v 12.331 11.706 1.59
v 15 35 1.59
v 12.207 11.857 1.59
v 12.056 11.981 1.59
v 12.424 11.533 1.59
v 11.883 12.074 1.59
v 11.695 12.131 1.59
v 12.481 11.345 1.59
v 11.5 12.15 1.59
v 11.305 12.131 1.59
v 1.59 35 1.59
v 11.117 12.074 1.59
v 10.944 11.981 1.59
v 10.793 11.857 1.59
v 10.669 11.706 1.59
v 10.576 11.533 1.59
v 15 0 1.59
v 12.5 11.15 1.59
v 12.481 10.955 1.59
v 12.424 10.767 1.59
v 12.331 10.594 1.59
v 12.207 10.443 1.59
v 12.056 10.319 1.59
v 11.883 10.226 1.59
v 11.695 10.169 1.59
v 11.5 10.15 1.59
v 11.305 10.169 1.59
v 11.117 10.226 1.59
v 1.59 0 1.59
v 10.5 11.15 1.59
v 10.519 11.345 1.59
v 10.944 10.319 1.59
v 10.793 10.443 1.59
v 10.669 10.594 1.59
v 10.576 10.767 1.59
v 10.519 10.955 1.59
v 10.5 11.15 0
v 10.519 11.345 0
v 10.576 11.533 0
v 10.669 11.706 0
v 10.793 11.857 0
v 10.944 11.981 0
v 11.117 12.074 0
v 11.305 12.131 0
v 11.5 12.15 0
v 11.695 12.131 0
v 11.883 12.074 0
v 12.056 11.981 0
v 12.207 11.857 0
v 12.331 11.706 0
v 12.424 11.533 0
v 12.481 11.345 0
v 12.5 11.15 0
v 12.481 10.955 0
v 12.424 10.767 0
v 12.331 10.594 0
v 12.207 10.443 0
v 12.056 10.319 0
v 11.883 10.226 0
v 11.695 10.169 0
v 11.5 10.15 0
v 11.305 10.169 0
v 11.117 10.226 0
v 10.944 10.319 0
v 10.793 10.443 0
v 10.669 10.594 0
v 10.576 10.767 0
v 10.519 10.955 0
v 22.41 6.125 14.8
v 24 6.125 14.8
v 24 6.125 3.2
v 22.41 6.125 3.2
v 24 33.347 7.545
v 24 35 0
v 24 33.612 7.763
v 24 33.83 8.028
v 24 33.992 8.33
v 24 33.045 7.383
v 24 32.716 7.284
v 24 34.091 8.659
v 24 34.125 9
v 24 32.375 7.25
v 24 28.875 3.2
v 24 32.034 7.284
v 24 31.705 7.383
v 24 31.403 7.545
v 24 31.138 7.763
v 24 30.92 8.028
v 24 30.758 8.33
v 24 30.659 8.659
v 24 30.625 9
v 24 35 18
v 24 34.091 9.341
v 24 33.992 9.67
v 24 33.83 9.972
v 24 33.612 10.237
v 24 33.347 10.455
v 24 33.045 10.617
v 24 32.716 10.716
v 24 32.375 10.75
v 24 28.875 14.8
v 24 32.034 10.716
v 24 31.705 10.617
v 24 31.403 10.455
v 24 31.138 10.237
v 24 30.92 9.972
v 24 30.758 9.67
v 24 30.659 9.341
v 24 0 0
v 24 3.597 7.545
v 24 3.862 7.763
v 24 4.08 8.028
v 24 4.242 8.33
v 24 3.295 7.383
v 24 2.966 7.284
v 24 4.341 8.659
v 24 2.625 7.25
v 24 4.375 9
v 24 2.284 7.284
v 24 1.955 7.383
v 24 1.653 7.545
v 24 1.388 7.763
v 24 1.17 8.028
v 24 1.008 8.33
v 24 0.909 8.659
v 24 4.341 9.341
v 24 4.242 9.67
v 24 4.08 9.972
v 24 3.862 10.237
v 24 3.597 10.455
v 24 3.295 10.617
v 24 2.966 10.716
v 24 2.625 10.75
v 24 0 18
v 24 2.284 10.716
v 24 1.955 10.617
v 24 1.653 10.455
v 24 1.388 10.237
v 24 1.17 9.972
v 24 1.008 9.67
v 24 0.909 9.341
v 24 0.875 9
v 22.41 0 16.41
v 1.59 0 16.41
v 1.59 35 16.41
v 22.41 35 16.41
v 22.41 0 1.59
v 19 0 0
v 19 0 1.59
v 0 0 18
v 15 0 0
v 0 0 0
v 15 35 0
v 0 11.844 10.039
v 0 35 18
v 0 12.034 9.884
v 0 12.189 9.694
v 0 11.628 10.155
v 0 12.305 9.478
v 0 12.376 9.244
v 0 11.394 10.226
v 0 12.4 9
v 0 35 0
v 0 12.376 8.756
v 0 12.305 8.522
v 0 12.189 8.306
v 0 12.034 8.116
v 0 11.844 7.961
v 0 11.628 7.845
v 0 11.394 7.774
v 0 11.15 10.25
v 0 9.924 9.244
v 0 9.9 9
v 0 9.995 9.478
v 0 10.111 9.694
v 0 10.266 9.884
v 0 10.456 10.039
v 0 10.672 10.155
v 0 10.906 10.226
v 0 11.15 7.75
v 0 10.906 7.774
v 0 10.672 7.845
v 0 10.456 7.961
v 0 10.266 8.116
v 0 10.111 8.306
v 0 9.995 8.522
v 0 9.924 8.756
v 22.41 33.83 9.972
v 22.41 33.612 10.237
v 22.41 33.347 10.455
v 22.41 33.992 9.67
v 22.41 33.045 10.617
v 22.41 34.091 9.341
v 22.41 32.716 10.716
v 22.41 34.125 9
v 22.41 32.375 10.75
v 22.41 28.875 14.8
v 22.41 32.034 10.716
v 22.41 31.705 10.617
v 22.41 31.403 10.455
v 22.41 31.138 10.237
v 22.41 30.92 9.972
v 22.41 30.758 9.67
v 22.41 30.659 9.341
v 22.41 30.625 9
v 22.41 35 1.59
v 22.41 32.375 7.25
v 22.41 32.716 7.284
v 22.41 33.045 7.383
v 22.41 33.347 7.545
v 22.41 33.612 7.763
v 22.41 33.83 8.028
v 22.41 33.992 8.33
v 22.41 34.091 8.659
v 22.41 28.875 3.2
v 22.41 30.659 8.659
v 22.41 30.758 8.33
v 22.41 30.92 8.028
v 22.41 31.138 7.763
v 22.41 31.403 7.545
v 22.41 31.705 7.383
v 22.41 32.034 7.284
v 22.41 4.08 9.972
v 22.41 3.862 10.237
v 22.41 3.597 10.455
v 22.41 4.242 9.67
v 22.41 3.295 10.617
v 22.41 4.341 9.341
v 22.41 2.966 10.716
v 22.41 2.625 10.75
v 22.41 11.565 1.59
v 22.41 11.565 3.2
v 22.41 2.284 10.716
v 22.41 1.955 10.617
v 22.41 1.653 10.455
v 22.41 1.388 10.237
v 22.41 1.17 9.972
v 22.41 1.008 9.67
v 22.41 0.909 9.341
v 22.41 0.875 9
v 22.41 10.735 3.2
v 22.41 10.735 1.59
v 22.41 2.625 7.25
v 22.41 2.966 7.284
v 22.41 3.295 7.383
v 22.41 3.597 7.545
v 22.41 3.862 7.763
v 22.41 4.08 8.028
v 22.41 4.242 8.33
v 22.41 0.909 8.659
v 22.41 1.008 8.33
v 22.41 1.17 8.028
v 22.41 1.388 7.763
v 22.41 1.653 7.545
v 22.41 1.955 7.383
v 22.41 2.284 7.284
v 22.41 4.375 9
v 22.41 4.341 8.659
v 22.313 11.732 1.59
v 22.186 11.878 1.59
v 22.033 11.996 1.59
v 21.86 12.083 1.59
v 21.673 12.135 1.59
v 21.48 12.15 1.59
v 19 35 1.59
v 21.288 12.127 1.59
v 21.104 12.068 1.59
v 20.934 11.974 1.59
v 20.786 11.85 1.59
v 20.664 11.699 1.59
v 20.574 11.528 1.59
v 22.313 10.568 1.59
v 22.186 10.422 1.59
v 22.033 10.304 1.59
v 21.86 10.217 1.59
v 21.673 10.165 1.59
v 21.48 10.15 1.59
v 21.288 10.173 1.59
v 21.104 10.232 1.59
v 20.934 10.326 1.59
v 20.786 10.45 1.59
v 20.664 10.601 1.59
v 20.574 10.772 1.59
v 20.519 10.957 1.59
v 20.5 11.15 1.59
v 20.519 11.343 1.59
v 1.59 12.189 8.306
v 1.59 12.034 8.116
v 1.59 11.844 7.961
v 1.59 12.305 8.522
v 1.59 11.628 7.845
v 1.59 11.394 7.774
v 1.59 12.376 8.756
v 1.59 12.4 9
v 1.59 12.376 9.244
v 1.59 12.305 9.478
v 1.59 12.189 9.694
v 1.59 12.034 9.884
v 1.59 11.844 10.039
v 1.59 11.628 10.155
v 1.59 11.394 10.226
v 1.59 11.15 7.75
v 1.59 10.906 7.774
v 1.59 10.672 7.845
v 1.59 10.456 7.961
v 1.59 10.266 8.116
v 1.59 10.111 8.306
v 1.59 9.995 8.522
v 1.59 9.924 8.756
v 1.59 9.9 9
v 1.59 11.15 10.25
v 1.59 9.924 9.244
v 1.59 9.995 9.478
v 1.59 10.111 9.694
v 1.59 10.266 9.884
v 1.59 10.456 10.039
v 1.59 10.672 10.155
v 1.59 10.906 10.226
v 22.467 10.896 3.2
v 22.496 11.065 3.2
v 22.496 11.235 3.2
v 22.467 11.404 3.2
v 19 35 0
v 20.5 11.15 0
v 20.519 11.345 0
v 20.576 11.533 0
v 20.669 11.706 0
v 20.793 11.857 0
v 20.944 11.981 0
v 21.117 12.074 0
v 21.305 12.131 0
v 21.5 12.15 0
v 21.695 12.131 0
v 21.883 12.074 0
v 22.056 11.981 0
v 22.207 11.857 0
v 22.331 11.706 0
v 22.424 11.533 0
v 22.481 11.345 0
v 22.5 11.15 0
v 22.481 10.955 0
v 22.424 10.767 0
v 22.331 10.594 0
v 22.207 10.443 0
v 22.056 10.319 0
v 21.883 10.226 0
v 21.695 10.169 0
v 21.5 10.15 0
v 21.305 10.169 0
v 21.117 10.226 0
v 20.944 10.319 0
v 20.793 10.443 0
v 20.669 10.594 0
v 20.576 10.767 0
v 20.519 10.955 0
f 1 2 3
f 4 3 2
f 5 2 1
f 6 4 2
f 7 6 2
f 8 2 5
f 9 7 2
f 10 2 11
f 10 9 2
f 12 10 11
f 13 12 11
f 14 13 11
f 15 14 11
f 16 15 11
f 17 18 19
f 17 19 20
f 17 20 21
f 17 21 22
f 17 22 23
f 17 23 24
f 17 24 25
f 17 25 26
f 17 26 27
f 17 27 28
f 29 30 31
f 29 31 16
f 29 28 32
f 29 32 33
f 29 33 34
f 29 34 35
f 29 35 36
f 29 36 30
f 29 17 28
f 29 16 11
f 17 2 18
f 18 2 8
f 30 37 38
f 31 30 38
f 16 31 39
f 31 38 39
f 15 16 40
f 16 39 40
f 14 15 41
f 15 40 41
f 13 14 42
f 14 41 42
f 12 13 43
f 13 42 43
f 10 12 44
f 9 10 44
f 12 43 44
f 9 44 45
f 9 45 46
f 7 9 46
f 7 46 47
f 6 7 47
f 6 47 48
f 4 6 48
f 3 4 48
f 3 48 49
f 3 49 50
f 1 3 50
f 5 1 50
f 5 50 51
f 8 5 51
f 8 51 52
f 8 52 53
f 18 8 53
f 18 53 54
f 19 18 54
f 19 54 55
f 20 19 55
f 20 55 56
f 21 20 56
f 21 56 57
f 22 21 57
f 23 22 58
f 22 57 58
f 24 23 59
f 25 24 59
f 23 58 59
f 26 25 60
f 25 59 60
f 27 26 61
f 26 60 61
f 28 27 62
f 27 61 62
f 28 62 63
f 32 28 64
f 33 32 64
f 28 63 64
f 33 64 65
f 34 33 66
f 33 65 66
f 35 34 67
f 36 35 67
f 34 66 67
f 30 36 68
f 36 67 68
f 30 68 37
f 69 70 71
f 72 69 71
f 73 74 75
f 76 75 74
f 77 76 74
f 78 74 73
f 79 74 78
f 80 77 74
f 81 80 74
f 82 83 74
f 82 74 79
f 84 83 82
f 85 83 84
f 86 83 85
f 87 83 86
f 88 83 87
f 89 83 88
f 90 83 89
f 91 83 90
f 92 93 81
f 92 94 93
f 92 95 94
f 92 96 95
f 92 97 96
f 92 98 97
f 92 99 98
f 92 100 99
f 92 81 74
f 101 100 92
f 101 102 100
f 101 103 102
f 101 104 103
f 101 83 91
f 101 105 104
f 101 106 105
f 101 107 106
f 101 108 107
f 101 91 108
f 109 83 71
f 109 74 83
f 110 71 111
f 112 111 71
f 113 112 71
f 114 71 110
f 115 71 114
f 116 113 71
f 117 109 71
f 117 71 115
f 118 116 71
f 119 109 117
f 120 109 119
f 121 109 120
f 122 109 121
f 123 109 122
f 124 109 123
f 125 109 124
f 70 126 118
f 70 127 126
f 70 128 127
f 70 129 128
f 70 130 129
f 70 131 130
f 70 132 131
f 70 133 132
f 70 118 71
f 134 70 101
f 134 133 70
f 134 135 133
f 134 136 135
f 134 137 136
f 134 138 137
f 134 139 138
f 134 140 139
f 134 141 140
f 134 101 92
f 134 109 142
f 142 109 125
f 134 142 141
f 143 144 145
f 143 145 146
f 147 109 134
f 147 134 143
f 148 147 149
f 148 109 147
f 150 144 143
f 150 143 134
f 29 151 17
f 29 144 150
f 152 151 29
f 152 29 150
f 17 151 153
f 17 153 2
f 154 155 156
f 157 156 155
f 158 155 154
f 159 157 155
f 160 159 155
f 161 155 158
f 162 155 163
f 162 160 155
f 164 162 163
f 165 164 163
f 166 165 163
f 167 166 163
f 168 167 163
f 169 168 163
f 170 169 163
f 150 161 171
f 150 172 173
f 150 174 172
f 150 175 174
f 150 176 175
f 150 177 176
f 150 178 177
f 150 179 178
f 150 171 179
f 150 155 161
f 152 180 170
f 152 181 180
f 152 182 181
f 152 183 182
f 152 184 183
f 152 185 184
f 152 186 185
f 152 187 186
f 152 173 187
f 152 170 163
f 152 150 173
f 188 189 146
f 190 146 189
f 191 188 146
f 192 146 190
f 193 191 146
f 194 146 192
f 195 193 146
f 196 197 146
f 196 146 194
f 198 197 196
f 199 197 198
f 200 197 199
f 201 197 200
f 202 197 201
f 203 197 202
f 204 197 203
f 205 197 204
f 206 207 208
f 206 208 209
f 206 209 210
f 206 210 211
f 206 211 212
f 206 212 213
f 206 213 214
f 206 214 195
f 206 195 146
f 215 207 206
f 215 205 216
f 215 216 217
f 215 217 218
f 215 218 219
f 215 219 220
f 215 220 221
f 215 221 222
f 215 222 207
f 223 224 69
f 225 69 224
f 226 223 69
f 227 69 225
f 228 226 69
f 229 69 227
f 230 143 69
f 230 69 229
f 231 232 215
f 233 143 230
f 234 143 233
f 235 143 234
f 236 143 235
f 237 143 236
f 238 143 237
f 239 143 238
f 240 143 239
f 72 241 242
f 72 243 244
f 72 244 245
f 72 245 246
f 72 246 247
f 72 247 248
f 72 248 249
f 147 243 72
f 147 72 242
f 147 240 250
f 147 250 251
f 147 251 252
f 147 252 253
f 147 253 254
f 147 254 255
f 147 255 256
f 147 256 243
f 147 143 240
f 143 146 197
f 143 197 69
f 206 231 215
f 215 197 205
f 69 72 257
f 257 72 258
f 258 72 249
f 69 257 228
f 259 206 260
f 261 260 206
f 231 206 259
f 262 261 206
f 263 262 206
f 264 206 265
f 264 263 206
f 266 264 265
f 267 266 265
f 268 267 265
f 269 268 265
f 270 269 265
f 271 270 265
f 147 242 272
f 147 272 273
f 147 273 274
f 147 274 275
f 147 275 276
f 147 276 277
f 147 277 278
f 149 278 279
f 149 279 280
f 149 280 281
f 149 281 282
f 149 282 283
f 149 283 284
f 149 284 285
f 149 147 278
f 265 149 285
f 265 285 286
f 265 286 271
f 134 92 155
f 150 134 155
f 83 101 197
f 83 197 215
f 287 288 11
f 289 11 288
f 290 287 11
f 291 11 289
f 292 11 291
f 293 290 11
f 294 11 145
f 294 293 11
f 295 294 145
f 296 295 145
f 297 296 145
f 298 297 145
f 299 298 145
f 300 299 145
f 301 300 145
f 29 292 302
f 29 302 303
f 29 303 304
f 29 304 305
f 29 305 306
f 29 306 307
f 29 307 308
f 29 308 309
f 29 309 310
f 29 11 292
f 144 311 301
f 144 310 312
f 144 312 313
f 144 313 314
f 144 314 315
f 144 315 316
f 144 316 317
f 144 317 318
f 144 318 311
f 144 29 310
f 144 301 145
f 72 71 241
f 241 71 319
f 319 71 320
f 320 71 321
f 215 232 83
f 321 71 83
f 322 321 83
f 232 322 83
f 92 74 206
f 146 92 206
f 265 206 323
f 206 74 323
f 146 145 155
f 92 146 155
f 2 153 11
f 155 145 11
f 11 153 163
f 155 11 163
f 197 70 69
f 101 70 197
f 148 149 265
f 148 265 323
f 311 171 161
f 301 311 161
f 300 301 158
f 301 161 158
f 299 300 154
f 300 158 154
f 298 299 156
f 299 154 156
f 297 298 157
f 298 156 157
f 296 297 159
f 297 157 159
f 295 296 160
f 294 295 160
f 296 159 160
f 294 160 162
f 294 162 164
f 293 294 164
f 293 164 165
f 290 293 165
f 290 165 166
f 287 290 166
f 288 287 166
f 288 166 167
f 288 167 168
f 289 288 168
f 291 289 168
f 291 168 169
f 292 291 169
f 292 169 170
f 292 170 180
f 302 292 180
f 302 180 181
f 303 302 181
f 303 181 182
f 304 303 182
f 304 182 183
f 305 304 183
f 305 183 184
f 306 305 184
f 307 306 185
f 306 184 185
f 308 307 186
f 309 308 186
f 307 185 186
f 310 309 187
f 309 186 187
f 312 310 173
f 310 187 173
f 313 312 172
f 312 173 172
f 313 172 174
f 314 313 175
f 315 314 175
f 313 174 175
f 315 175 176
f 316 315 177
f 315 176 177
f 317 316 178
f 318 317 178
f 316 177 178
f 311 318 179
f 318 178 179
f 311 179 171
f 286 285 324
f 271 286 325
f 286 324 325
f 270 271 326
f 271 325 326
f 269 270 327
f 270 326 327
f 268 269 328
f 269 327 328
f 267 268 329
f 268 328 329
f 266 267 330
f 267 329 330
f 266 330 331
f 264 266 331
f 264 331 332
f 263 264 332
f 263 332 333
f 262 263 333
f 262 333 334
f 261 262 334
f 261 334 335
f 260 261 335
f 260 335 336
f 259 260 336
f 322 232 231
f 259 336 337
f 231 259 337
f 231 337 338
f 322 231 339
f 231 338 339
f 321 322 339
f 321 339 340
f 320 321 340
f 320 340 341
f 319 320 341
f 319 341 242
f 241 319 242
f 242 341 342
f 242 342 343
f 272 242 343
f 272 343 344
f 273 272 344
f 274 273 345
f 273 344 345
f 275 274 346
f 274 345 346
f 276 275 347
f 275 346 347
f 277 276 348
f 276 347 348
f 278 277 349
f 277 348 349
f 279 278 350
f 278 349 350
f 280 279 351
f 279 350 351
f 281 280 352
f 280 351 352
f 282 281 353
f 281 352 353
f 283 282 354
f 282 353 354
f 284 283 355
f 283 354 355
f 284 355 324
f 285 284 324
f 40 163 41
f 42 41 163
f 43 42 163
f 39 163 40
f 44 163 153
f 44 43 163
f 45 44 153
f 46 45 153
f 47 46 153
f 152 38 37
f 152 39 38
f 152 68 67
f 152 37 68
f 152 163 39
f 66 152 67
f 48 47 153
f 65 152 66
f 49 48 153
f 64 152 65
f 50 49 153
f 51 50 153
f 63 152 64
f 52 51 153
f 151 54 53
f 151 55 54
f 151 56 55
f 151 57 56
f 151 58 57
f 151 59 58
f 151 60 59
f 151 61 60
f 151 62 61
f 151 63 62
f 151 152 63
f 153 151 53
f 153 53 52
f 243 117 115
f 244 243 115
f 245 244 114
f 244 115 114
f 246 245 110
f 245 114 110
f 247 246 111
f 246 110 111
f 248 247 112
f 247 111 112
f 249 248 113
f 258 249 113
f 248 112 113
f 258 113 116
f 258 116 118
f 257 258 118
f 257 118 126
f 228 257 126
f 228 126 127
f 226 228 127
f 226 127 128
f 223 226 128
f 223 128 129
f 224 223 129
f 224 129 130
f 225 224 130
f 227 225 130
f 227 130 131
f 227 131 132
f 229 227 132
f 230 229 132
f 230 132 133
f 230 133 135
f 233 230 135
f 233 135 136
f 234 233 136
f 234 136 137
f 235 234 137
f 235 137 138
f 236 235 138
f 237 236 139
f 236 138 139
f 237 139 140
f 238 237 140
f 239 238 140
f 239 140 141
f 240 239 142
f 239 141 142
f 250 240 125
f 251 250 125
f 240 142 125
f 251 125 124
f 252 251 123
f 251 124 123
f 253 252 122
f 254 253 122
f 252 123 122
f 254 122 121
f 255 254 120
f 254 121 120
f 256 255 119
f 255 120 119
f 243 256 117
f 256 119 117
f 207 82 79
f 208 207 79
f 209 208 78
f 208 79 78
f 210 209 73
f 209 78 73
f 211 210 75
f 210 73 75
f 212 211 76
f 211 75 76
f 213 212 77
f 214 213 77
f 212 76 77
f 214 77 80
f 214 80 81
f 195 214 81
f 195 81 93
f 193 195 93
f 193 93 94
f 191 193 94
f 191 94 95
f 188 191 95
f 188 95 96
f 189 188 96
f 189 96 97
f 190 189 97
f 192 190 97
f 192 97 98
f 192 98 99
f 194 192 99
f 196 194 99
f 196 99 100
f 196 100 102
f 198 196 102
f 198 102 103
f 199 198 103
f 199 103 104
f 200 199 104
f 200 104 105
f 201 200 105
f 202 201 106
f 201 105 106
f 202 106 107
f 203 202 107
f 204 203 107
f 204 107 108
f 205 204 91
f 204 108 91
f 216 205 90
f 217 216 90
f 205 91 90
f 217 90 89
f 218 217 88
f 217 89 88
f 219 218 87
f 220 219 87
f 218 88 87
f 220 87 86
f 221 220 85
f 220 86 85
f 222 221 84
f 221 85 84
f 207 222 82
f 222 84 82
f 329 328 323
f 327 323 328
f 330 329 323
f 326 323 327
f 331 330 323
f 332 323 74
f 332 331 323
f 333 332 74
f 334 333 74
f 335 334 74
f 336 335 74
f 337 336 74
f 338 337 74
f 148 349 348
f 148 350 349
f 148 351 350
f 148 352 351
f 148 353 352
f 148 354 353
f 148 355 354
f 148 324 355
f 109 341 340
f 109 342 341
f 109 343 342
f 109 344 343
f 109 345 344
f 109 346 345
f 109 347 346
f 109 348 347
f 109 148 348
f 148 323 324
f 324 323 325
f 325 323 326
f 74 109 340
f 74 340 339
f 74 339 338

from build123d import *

# Parameters (mm, degrees)
BOSS_EXTRUDE1_DEPTH = 35
SKETCH2_R           = 1.75
SKETCH2_W           = 11.6
SKETCH2_H           = 22.75
CUT_EXTRUDE1_DEPTH  = 4
SKETCH3_R           = 1.25
CUT_EXTRUDE2_DEPTH  = 32
SKETCH4_R           = 1
CUT_EXTRUDE3_DEPTH  = 4


with BuildPart() as part:
    # Sketch1 → Boss-Extrude1 (new body)
    with BuildSketch(Plane(origin=(0, 0, 0), x_dir=(1, 0, 0), z_dir=(0, 1, 0))):
        Polygon((15, 0), (15, -1.59), (1.59, -1.59), (1.59, -16.41), (22.41, -16.41), (22.41, -1.59), (19, -1.59), (19, 0), (24, 0), (24, -18), (0, -18), (0, 0), align=None)
    extrude(amount=BOSS_EXTRUDE1_DEPTH)

    # Sketch2 → Cut-Extrude1 (cut)
    with BuildSketch(Plane(origin=(24, 0, 0), x_dir=(0, 0, -1), z_dir=(1, 0, 0))):
        with Locations((-9, 32.375)):
            Circle(SKETCH2_R)
        with Locations((-9, 2.625)):
            Circle(SKETCH2_R)
        with Locations((-9, 17.5)):
            Rectangle(SKETCH2_W, SKETCH2_H)
    extrude(amount=-CUT_EXTRUDE1_DEPTH, mode=Mode.SUBTRACT)

    # Sketch3 → Cut-Extrude2 (cut)
    with BuildSketch(Plane.ZY):
        with Locations((9, 11.15)):
            Circle(SKETCH3_R)
    extrude(amount=-CUT_EXTRUDE2_DEPTH, mode=Mode.SUBTRACT)

    # Sketch4 → Cut-Extrude3 (cut)
    with BuildSketch(Plane(origin=(0, 0, 0), x_dir=(-1, 0, 0), z_dir=(0, 0, -1))):
        with Locations((-11.5, 11.15)):
            Circle(SKETCH4_R)
        with Locations((-21.5, 11.15)):
            Circle(SKETCH4_R)
    extrude(amount=-CUT_EXTRUDE3_DEPTH, mode=Mode.SUBTRACT)


solid = part.part
